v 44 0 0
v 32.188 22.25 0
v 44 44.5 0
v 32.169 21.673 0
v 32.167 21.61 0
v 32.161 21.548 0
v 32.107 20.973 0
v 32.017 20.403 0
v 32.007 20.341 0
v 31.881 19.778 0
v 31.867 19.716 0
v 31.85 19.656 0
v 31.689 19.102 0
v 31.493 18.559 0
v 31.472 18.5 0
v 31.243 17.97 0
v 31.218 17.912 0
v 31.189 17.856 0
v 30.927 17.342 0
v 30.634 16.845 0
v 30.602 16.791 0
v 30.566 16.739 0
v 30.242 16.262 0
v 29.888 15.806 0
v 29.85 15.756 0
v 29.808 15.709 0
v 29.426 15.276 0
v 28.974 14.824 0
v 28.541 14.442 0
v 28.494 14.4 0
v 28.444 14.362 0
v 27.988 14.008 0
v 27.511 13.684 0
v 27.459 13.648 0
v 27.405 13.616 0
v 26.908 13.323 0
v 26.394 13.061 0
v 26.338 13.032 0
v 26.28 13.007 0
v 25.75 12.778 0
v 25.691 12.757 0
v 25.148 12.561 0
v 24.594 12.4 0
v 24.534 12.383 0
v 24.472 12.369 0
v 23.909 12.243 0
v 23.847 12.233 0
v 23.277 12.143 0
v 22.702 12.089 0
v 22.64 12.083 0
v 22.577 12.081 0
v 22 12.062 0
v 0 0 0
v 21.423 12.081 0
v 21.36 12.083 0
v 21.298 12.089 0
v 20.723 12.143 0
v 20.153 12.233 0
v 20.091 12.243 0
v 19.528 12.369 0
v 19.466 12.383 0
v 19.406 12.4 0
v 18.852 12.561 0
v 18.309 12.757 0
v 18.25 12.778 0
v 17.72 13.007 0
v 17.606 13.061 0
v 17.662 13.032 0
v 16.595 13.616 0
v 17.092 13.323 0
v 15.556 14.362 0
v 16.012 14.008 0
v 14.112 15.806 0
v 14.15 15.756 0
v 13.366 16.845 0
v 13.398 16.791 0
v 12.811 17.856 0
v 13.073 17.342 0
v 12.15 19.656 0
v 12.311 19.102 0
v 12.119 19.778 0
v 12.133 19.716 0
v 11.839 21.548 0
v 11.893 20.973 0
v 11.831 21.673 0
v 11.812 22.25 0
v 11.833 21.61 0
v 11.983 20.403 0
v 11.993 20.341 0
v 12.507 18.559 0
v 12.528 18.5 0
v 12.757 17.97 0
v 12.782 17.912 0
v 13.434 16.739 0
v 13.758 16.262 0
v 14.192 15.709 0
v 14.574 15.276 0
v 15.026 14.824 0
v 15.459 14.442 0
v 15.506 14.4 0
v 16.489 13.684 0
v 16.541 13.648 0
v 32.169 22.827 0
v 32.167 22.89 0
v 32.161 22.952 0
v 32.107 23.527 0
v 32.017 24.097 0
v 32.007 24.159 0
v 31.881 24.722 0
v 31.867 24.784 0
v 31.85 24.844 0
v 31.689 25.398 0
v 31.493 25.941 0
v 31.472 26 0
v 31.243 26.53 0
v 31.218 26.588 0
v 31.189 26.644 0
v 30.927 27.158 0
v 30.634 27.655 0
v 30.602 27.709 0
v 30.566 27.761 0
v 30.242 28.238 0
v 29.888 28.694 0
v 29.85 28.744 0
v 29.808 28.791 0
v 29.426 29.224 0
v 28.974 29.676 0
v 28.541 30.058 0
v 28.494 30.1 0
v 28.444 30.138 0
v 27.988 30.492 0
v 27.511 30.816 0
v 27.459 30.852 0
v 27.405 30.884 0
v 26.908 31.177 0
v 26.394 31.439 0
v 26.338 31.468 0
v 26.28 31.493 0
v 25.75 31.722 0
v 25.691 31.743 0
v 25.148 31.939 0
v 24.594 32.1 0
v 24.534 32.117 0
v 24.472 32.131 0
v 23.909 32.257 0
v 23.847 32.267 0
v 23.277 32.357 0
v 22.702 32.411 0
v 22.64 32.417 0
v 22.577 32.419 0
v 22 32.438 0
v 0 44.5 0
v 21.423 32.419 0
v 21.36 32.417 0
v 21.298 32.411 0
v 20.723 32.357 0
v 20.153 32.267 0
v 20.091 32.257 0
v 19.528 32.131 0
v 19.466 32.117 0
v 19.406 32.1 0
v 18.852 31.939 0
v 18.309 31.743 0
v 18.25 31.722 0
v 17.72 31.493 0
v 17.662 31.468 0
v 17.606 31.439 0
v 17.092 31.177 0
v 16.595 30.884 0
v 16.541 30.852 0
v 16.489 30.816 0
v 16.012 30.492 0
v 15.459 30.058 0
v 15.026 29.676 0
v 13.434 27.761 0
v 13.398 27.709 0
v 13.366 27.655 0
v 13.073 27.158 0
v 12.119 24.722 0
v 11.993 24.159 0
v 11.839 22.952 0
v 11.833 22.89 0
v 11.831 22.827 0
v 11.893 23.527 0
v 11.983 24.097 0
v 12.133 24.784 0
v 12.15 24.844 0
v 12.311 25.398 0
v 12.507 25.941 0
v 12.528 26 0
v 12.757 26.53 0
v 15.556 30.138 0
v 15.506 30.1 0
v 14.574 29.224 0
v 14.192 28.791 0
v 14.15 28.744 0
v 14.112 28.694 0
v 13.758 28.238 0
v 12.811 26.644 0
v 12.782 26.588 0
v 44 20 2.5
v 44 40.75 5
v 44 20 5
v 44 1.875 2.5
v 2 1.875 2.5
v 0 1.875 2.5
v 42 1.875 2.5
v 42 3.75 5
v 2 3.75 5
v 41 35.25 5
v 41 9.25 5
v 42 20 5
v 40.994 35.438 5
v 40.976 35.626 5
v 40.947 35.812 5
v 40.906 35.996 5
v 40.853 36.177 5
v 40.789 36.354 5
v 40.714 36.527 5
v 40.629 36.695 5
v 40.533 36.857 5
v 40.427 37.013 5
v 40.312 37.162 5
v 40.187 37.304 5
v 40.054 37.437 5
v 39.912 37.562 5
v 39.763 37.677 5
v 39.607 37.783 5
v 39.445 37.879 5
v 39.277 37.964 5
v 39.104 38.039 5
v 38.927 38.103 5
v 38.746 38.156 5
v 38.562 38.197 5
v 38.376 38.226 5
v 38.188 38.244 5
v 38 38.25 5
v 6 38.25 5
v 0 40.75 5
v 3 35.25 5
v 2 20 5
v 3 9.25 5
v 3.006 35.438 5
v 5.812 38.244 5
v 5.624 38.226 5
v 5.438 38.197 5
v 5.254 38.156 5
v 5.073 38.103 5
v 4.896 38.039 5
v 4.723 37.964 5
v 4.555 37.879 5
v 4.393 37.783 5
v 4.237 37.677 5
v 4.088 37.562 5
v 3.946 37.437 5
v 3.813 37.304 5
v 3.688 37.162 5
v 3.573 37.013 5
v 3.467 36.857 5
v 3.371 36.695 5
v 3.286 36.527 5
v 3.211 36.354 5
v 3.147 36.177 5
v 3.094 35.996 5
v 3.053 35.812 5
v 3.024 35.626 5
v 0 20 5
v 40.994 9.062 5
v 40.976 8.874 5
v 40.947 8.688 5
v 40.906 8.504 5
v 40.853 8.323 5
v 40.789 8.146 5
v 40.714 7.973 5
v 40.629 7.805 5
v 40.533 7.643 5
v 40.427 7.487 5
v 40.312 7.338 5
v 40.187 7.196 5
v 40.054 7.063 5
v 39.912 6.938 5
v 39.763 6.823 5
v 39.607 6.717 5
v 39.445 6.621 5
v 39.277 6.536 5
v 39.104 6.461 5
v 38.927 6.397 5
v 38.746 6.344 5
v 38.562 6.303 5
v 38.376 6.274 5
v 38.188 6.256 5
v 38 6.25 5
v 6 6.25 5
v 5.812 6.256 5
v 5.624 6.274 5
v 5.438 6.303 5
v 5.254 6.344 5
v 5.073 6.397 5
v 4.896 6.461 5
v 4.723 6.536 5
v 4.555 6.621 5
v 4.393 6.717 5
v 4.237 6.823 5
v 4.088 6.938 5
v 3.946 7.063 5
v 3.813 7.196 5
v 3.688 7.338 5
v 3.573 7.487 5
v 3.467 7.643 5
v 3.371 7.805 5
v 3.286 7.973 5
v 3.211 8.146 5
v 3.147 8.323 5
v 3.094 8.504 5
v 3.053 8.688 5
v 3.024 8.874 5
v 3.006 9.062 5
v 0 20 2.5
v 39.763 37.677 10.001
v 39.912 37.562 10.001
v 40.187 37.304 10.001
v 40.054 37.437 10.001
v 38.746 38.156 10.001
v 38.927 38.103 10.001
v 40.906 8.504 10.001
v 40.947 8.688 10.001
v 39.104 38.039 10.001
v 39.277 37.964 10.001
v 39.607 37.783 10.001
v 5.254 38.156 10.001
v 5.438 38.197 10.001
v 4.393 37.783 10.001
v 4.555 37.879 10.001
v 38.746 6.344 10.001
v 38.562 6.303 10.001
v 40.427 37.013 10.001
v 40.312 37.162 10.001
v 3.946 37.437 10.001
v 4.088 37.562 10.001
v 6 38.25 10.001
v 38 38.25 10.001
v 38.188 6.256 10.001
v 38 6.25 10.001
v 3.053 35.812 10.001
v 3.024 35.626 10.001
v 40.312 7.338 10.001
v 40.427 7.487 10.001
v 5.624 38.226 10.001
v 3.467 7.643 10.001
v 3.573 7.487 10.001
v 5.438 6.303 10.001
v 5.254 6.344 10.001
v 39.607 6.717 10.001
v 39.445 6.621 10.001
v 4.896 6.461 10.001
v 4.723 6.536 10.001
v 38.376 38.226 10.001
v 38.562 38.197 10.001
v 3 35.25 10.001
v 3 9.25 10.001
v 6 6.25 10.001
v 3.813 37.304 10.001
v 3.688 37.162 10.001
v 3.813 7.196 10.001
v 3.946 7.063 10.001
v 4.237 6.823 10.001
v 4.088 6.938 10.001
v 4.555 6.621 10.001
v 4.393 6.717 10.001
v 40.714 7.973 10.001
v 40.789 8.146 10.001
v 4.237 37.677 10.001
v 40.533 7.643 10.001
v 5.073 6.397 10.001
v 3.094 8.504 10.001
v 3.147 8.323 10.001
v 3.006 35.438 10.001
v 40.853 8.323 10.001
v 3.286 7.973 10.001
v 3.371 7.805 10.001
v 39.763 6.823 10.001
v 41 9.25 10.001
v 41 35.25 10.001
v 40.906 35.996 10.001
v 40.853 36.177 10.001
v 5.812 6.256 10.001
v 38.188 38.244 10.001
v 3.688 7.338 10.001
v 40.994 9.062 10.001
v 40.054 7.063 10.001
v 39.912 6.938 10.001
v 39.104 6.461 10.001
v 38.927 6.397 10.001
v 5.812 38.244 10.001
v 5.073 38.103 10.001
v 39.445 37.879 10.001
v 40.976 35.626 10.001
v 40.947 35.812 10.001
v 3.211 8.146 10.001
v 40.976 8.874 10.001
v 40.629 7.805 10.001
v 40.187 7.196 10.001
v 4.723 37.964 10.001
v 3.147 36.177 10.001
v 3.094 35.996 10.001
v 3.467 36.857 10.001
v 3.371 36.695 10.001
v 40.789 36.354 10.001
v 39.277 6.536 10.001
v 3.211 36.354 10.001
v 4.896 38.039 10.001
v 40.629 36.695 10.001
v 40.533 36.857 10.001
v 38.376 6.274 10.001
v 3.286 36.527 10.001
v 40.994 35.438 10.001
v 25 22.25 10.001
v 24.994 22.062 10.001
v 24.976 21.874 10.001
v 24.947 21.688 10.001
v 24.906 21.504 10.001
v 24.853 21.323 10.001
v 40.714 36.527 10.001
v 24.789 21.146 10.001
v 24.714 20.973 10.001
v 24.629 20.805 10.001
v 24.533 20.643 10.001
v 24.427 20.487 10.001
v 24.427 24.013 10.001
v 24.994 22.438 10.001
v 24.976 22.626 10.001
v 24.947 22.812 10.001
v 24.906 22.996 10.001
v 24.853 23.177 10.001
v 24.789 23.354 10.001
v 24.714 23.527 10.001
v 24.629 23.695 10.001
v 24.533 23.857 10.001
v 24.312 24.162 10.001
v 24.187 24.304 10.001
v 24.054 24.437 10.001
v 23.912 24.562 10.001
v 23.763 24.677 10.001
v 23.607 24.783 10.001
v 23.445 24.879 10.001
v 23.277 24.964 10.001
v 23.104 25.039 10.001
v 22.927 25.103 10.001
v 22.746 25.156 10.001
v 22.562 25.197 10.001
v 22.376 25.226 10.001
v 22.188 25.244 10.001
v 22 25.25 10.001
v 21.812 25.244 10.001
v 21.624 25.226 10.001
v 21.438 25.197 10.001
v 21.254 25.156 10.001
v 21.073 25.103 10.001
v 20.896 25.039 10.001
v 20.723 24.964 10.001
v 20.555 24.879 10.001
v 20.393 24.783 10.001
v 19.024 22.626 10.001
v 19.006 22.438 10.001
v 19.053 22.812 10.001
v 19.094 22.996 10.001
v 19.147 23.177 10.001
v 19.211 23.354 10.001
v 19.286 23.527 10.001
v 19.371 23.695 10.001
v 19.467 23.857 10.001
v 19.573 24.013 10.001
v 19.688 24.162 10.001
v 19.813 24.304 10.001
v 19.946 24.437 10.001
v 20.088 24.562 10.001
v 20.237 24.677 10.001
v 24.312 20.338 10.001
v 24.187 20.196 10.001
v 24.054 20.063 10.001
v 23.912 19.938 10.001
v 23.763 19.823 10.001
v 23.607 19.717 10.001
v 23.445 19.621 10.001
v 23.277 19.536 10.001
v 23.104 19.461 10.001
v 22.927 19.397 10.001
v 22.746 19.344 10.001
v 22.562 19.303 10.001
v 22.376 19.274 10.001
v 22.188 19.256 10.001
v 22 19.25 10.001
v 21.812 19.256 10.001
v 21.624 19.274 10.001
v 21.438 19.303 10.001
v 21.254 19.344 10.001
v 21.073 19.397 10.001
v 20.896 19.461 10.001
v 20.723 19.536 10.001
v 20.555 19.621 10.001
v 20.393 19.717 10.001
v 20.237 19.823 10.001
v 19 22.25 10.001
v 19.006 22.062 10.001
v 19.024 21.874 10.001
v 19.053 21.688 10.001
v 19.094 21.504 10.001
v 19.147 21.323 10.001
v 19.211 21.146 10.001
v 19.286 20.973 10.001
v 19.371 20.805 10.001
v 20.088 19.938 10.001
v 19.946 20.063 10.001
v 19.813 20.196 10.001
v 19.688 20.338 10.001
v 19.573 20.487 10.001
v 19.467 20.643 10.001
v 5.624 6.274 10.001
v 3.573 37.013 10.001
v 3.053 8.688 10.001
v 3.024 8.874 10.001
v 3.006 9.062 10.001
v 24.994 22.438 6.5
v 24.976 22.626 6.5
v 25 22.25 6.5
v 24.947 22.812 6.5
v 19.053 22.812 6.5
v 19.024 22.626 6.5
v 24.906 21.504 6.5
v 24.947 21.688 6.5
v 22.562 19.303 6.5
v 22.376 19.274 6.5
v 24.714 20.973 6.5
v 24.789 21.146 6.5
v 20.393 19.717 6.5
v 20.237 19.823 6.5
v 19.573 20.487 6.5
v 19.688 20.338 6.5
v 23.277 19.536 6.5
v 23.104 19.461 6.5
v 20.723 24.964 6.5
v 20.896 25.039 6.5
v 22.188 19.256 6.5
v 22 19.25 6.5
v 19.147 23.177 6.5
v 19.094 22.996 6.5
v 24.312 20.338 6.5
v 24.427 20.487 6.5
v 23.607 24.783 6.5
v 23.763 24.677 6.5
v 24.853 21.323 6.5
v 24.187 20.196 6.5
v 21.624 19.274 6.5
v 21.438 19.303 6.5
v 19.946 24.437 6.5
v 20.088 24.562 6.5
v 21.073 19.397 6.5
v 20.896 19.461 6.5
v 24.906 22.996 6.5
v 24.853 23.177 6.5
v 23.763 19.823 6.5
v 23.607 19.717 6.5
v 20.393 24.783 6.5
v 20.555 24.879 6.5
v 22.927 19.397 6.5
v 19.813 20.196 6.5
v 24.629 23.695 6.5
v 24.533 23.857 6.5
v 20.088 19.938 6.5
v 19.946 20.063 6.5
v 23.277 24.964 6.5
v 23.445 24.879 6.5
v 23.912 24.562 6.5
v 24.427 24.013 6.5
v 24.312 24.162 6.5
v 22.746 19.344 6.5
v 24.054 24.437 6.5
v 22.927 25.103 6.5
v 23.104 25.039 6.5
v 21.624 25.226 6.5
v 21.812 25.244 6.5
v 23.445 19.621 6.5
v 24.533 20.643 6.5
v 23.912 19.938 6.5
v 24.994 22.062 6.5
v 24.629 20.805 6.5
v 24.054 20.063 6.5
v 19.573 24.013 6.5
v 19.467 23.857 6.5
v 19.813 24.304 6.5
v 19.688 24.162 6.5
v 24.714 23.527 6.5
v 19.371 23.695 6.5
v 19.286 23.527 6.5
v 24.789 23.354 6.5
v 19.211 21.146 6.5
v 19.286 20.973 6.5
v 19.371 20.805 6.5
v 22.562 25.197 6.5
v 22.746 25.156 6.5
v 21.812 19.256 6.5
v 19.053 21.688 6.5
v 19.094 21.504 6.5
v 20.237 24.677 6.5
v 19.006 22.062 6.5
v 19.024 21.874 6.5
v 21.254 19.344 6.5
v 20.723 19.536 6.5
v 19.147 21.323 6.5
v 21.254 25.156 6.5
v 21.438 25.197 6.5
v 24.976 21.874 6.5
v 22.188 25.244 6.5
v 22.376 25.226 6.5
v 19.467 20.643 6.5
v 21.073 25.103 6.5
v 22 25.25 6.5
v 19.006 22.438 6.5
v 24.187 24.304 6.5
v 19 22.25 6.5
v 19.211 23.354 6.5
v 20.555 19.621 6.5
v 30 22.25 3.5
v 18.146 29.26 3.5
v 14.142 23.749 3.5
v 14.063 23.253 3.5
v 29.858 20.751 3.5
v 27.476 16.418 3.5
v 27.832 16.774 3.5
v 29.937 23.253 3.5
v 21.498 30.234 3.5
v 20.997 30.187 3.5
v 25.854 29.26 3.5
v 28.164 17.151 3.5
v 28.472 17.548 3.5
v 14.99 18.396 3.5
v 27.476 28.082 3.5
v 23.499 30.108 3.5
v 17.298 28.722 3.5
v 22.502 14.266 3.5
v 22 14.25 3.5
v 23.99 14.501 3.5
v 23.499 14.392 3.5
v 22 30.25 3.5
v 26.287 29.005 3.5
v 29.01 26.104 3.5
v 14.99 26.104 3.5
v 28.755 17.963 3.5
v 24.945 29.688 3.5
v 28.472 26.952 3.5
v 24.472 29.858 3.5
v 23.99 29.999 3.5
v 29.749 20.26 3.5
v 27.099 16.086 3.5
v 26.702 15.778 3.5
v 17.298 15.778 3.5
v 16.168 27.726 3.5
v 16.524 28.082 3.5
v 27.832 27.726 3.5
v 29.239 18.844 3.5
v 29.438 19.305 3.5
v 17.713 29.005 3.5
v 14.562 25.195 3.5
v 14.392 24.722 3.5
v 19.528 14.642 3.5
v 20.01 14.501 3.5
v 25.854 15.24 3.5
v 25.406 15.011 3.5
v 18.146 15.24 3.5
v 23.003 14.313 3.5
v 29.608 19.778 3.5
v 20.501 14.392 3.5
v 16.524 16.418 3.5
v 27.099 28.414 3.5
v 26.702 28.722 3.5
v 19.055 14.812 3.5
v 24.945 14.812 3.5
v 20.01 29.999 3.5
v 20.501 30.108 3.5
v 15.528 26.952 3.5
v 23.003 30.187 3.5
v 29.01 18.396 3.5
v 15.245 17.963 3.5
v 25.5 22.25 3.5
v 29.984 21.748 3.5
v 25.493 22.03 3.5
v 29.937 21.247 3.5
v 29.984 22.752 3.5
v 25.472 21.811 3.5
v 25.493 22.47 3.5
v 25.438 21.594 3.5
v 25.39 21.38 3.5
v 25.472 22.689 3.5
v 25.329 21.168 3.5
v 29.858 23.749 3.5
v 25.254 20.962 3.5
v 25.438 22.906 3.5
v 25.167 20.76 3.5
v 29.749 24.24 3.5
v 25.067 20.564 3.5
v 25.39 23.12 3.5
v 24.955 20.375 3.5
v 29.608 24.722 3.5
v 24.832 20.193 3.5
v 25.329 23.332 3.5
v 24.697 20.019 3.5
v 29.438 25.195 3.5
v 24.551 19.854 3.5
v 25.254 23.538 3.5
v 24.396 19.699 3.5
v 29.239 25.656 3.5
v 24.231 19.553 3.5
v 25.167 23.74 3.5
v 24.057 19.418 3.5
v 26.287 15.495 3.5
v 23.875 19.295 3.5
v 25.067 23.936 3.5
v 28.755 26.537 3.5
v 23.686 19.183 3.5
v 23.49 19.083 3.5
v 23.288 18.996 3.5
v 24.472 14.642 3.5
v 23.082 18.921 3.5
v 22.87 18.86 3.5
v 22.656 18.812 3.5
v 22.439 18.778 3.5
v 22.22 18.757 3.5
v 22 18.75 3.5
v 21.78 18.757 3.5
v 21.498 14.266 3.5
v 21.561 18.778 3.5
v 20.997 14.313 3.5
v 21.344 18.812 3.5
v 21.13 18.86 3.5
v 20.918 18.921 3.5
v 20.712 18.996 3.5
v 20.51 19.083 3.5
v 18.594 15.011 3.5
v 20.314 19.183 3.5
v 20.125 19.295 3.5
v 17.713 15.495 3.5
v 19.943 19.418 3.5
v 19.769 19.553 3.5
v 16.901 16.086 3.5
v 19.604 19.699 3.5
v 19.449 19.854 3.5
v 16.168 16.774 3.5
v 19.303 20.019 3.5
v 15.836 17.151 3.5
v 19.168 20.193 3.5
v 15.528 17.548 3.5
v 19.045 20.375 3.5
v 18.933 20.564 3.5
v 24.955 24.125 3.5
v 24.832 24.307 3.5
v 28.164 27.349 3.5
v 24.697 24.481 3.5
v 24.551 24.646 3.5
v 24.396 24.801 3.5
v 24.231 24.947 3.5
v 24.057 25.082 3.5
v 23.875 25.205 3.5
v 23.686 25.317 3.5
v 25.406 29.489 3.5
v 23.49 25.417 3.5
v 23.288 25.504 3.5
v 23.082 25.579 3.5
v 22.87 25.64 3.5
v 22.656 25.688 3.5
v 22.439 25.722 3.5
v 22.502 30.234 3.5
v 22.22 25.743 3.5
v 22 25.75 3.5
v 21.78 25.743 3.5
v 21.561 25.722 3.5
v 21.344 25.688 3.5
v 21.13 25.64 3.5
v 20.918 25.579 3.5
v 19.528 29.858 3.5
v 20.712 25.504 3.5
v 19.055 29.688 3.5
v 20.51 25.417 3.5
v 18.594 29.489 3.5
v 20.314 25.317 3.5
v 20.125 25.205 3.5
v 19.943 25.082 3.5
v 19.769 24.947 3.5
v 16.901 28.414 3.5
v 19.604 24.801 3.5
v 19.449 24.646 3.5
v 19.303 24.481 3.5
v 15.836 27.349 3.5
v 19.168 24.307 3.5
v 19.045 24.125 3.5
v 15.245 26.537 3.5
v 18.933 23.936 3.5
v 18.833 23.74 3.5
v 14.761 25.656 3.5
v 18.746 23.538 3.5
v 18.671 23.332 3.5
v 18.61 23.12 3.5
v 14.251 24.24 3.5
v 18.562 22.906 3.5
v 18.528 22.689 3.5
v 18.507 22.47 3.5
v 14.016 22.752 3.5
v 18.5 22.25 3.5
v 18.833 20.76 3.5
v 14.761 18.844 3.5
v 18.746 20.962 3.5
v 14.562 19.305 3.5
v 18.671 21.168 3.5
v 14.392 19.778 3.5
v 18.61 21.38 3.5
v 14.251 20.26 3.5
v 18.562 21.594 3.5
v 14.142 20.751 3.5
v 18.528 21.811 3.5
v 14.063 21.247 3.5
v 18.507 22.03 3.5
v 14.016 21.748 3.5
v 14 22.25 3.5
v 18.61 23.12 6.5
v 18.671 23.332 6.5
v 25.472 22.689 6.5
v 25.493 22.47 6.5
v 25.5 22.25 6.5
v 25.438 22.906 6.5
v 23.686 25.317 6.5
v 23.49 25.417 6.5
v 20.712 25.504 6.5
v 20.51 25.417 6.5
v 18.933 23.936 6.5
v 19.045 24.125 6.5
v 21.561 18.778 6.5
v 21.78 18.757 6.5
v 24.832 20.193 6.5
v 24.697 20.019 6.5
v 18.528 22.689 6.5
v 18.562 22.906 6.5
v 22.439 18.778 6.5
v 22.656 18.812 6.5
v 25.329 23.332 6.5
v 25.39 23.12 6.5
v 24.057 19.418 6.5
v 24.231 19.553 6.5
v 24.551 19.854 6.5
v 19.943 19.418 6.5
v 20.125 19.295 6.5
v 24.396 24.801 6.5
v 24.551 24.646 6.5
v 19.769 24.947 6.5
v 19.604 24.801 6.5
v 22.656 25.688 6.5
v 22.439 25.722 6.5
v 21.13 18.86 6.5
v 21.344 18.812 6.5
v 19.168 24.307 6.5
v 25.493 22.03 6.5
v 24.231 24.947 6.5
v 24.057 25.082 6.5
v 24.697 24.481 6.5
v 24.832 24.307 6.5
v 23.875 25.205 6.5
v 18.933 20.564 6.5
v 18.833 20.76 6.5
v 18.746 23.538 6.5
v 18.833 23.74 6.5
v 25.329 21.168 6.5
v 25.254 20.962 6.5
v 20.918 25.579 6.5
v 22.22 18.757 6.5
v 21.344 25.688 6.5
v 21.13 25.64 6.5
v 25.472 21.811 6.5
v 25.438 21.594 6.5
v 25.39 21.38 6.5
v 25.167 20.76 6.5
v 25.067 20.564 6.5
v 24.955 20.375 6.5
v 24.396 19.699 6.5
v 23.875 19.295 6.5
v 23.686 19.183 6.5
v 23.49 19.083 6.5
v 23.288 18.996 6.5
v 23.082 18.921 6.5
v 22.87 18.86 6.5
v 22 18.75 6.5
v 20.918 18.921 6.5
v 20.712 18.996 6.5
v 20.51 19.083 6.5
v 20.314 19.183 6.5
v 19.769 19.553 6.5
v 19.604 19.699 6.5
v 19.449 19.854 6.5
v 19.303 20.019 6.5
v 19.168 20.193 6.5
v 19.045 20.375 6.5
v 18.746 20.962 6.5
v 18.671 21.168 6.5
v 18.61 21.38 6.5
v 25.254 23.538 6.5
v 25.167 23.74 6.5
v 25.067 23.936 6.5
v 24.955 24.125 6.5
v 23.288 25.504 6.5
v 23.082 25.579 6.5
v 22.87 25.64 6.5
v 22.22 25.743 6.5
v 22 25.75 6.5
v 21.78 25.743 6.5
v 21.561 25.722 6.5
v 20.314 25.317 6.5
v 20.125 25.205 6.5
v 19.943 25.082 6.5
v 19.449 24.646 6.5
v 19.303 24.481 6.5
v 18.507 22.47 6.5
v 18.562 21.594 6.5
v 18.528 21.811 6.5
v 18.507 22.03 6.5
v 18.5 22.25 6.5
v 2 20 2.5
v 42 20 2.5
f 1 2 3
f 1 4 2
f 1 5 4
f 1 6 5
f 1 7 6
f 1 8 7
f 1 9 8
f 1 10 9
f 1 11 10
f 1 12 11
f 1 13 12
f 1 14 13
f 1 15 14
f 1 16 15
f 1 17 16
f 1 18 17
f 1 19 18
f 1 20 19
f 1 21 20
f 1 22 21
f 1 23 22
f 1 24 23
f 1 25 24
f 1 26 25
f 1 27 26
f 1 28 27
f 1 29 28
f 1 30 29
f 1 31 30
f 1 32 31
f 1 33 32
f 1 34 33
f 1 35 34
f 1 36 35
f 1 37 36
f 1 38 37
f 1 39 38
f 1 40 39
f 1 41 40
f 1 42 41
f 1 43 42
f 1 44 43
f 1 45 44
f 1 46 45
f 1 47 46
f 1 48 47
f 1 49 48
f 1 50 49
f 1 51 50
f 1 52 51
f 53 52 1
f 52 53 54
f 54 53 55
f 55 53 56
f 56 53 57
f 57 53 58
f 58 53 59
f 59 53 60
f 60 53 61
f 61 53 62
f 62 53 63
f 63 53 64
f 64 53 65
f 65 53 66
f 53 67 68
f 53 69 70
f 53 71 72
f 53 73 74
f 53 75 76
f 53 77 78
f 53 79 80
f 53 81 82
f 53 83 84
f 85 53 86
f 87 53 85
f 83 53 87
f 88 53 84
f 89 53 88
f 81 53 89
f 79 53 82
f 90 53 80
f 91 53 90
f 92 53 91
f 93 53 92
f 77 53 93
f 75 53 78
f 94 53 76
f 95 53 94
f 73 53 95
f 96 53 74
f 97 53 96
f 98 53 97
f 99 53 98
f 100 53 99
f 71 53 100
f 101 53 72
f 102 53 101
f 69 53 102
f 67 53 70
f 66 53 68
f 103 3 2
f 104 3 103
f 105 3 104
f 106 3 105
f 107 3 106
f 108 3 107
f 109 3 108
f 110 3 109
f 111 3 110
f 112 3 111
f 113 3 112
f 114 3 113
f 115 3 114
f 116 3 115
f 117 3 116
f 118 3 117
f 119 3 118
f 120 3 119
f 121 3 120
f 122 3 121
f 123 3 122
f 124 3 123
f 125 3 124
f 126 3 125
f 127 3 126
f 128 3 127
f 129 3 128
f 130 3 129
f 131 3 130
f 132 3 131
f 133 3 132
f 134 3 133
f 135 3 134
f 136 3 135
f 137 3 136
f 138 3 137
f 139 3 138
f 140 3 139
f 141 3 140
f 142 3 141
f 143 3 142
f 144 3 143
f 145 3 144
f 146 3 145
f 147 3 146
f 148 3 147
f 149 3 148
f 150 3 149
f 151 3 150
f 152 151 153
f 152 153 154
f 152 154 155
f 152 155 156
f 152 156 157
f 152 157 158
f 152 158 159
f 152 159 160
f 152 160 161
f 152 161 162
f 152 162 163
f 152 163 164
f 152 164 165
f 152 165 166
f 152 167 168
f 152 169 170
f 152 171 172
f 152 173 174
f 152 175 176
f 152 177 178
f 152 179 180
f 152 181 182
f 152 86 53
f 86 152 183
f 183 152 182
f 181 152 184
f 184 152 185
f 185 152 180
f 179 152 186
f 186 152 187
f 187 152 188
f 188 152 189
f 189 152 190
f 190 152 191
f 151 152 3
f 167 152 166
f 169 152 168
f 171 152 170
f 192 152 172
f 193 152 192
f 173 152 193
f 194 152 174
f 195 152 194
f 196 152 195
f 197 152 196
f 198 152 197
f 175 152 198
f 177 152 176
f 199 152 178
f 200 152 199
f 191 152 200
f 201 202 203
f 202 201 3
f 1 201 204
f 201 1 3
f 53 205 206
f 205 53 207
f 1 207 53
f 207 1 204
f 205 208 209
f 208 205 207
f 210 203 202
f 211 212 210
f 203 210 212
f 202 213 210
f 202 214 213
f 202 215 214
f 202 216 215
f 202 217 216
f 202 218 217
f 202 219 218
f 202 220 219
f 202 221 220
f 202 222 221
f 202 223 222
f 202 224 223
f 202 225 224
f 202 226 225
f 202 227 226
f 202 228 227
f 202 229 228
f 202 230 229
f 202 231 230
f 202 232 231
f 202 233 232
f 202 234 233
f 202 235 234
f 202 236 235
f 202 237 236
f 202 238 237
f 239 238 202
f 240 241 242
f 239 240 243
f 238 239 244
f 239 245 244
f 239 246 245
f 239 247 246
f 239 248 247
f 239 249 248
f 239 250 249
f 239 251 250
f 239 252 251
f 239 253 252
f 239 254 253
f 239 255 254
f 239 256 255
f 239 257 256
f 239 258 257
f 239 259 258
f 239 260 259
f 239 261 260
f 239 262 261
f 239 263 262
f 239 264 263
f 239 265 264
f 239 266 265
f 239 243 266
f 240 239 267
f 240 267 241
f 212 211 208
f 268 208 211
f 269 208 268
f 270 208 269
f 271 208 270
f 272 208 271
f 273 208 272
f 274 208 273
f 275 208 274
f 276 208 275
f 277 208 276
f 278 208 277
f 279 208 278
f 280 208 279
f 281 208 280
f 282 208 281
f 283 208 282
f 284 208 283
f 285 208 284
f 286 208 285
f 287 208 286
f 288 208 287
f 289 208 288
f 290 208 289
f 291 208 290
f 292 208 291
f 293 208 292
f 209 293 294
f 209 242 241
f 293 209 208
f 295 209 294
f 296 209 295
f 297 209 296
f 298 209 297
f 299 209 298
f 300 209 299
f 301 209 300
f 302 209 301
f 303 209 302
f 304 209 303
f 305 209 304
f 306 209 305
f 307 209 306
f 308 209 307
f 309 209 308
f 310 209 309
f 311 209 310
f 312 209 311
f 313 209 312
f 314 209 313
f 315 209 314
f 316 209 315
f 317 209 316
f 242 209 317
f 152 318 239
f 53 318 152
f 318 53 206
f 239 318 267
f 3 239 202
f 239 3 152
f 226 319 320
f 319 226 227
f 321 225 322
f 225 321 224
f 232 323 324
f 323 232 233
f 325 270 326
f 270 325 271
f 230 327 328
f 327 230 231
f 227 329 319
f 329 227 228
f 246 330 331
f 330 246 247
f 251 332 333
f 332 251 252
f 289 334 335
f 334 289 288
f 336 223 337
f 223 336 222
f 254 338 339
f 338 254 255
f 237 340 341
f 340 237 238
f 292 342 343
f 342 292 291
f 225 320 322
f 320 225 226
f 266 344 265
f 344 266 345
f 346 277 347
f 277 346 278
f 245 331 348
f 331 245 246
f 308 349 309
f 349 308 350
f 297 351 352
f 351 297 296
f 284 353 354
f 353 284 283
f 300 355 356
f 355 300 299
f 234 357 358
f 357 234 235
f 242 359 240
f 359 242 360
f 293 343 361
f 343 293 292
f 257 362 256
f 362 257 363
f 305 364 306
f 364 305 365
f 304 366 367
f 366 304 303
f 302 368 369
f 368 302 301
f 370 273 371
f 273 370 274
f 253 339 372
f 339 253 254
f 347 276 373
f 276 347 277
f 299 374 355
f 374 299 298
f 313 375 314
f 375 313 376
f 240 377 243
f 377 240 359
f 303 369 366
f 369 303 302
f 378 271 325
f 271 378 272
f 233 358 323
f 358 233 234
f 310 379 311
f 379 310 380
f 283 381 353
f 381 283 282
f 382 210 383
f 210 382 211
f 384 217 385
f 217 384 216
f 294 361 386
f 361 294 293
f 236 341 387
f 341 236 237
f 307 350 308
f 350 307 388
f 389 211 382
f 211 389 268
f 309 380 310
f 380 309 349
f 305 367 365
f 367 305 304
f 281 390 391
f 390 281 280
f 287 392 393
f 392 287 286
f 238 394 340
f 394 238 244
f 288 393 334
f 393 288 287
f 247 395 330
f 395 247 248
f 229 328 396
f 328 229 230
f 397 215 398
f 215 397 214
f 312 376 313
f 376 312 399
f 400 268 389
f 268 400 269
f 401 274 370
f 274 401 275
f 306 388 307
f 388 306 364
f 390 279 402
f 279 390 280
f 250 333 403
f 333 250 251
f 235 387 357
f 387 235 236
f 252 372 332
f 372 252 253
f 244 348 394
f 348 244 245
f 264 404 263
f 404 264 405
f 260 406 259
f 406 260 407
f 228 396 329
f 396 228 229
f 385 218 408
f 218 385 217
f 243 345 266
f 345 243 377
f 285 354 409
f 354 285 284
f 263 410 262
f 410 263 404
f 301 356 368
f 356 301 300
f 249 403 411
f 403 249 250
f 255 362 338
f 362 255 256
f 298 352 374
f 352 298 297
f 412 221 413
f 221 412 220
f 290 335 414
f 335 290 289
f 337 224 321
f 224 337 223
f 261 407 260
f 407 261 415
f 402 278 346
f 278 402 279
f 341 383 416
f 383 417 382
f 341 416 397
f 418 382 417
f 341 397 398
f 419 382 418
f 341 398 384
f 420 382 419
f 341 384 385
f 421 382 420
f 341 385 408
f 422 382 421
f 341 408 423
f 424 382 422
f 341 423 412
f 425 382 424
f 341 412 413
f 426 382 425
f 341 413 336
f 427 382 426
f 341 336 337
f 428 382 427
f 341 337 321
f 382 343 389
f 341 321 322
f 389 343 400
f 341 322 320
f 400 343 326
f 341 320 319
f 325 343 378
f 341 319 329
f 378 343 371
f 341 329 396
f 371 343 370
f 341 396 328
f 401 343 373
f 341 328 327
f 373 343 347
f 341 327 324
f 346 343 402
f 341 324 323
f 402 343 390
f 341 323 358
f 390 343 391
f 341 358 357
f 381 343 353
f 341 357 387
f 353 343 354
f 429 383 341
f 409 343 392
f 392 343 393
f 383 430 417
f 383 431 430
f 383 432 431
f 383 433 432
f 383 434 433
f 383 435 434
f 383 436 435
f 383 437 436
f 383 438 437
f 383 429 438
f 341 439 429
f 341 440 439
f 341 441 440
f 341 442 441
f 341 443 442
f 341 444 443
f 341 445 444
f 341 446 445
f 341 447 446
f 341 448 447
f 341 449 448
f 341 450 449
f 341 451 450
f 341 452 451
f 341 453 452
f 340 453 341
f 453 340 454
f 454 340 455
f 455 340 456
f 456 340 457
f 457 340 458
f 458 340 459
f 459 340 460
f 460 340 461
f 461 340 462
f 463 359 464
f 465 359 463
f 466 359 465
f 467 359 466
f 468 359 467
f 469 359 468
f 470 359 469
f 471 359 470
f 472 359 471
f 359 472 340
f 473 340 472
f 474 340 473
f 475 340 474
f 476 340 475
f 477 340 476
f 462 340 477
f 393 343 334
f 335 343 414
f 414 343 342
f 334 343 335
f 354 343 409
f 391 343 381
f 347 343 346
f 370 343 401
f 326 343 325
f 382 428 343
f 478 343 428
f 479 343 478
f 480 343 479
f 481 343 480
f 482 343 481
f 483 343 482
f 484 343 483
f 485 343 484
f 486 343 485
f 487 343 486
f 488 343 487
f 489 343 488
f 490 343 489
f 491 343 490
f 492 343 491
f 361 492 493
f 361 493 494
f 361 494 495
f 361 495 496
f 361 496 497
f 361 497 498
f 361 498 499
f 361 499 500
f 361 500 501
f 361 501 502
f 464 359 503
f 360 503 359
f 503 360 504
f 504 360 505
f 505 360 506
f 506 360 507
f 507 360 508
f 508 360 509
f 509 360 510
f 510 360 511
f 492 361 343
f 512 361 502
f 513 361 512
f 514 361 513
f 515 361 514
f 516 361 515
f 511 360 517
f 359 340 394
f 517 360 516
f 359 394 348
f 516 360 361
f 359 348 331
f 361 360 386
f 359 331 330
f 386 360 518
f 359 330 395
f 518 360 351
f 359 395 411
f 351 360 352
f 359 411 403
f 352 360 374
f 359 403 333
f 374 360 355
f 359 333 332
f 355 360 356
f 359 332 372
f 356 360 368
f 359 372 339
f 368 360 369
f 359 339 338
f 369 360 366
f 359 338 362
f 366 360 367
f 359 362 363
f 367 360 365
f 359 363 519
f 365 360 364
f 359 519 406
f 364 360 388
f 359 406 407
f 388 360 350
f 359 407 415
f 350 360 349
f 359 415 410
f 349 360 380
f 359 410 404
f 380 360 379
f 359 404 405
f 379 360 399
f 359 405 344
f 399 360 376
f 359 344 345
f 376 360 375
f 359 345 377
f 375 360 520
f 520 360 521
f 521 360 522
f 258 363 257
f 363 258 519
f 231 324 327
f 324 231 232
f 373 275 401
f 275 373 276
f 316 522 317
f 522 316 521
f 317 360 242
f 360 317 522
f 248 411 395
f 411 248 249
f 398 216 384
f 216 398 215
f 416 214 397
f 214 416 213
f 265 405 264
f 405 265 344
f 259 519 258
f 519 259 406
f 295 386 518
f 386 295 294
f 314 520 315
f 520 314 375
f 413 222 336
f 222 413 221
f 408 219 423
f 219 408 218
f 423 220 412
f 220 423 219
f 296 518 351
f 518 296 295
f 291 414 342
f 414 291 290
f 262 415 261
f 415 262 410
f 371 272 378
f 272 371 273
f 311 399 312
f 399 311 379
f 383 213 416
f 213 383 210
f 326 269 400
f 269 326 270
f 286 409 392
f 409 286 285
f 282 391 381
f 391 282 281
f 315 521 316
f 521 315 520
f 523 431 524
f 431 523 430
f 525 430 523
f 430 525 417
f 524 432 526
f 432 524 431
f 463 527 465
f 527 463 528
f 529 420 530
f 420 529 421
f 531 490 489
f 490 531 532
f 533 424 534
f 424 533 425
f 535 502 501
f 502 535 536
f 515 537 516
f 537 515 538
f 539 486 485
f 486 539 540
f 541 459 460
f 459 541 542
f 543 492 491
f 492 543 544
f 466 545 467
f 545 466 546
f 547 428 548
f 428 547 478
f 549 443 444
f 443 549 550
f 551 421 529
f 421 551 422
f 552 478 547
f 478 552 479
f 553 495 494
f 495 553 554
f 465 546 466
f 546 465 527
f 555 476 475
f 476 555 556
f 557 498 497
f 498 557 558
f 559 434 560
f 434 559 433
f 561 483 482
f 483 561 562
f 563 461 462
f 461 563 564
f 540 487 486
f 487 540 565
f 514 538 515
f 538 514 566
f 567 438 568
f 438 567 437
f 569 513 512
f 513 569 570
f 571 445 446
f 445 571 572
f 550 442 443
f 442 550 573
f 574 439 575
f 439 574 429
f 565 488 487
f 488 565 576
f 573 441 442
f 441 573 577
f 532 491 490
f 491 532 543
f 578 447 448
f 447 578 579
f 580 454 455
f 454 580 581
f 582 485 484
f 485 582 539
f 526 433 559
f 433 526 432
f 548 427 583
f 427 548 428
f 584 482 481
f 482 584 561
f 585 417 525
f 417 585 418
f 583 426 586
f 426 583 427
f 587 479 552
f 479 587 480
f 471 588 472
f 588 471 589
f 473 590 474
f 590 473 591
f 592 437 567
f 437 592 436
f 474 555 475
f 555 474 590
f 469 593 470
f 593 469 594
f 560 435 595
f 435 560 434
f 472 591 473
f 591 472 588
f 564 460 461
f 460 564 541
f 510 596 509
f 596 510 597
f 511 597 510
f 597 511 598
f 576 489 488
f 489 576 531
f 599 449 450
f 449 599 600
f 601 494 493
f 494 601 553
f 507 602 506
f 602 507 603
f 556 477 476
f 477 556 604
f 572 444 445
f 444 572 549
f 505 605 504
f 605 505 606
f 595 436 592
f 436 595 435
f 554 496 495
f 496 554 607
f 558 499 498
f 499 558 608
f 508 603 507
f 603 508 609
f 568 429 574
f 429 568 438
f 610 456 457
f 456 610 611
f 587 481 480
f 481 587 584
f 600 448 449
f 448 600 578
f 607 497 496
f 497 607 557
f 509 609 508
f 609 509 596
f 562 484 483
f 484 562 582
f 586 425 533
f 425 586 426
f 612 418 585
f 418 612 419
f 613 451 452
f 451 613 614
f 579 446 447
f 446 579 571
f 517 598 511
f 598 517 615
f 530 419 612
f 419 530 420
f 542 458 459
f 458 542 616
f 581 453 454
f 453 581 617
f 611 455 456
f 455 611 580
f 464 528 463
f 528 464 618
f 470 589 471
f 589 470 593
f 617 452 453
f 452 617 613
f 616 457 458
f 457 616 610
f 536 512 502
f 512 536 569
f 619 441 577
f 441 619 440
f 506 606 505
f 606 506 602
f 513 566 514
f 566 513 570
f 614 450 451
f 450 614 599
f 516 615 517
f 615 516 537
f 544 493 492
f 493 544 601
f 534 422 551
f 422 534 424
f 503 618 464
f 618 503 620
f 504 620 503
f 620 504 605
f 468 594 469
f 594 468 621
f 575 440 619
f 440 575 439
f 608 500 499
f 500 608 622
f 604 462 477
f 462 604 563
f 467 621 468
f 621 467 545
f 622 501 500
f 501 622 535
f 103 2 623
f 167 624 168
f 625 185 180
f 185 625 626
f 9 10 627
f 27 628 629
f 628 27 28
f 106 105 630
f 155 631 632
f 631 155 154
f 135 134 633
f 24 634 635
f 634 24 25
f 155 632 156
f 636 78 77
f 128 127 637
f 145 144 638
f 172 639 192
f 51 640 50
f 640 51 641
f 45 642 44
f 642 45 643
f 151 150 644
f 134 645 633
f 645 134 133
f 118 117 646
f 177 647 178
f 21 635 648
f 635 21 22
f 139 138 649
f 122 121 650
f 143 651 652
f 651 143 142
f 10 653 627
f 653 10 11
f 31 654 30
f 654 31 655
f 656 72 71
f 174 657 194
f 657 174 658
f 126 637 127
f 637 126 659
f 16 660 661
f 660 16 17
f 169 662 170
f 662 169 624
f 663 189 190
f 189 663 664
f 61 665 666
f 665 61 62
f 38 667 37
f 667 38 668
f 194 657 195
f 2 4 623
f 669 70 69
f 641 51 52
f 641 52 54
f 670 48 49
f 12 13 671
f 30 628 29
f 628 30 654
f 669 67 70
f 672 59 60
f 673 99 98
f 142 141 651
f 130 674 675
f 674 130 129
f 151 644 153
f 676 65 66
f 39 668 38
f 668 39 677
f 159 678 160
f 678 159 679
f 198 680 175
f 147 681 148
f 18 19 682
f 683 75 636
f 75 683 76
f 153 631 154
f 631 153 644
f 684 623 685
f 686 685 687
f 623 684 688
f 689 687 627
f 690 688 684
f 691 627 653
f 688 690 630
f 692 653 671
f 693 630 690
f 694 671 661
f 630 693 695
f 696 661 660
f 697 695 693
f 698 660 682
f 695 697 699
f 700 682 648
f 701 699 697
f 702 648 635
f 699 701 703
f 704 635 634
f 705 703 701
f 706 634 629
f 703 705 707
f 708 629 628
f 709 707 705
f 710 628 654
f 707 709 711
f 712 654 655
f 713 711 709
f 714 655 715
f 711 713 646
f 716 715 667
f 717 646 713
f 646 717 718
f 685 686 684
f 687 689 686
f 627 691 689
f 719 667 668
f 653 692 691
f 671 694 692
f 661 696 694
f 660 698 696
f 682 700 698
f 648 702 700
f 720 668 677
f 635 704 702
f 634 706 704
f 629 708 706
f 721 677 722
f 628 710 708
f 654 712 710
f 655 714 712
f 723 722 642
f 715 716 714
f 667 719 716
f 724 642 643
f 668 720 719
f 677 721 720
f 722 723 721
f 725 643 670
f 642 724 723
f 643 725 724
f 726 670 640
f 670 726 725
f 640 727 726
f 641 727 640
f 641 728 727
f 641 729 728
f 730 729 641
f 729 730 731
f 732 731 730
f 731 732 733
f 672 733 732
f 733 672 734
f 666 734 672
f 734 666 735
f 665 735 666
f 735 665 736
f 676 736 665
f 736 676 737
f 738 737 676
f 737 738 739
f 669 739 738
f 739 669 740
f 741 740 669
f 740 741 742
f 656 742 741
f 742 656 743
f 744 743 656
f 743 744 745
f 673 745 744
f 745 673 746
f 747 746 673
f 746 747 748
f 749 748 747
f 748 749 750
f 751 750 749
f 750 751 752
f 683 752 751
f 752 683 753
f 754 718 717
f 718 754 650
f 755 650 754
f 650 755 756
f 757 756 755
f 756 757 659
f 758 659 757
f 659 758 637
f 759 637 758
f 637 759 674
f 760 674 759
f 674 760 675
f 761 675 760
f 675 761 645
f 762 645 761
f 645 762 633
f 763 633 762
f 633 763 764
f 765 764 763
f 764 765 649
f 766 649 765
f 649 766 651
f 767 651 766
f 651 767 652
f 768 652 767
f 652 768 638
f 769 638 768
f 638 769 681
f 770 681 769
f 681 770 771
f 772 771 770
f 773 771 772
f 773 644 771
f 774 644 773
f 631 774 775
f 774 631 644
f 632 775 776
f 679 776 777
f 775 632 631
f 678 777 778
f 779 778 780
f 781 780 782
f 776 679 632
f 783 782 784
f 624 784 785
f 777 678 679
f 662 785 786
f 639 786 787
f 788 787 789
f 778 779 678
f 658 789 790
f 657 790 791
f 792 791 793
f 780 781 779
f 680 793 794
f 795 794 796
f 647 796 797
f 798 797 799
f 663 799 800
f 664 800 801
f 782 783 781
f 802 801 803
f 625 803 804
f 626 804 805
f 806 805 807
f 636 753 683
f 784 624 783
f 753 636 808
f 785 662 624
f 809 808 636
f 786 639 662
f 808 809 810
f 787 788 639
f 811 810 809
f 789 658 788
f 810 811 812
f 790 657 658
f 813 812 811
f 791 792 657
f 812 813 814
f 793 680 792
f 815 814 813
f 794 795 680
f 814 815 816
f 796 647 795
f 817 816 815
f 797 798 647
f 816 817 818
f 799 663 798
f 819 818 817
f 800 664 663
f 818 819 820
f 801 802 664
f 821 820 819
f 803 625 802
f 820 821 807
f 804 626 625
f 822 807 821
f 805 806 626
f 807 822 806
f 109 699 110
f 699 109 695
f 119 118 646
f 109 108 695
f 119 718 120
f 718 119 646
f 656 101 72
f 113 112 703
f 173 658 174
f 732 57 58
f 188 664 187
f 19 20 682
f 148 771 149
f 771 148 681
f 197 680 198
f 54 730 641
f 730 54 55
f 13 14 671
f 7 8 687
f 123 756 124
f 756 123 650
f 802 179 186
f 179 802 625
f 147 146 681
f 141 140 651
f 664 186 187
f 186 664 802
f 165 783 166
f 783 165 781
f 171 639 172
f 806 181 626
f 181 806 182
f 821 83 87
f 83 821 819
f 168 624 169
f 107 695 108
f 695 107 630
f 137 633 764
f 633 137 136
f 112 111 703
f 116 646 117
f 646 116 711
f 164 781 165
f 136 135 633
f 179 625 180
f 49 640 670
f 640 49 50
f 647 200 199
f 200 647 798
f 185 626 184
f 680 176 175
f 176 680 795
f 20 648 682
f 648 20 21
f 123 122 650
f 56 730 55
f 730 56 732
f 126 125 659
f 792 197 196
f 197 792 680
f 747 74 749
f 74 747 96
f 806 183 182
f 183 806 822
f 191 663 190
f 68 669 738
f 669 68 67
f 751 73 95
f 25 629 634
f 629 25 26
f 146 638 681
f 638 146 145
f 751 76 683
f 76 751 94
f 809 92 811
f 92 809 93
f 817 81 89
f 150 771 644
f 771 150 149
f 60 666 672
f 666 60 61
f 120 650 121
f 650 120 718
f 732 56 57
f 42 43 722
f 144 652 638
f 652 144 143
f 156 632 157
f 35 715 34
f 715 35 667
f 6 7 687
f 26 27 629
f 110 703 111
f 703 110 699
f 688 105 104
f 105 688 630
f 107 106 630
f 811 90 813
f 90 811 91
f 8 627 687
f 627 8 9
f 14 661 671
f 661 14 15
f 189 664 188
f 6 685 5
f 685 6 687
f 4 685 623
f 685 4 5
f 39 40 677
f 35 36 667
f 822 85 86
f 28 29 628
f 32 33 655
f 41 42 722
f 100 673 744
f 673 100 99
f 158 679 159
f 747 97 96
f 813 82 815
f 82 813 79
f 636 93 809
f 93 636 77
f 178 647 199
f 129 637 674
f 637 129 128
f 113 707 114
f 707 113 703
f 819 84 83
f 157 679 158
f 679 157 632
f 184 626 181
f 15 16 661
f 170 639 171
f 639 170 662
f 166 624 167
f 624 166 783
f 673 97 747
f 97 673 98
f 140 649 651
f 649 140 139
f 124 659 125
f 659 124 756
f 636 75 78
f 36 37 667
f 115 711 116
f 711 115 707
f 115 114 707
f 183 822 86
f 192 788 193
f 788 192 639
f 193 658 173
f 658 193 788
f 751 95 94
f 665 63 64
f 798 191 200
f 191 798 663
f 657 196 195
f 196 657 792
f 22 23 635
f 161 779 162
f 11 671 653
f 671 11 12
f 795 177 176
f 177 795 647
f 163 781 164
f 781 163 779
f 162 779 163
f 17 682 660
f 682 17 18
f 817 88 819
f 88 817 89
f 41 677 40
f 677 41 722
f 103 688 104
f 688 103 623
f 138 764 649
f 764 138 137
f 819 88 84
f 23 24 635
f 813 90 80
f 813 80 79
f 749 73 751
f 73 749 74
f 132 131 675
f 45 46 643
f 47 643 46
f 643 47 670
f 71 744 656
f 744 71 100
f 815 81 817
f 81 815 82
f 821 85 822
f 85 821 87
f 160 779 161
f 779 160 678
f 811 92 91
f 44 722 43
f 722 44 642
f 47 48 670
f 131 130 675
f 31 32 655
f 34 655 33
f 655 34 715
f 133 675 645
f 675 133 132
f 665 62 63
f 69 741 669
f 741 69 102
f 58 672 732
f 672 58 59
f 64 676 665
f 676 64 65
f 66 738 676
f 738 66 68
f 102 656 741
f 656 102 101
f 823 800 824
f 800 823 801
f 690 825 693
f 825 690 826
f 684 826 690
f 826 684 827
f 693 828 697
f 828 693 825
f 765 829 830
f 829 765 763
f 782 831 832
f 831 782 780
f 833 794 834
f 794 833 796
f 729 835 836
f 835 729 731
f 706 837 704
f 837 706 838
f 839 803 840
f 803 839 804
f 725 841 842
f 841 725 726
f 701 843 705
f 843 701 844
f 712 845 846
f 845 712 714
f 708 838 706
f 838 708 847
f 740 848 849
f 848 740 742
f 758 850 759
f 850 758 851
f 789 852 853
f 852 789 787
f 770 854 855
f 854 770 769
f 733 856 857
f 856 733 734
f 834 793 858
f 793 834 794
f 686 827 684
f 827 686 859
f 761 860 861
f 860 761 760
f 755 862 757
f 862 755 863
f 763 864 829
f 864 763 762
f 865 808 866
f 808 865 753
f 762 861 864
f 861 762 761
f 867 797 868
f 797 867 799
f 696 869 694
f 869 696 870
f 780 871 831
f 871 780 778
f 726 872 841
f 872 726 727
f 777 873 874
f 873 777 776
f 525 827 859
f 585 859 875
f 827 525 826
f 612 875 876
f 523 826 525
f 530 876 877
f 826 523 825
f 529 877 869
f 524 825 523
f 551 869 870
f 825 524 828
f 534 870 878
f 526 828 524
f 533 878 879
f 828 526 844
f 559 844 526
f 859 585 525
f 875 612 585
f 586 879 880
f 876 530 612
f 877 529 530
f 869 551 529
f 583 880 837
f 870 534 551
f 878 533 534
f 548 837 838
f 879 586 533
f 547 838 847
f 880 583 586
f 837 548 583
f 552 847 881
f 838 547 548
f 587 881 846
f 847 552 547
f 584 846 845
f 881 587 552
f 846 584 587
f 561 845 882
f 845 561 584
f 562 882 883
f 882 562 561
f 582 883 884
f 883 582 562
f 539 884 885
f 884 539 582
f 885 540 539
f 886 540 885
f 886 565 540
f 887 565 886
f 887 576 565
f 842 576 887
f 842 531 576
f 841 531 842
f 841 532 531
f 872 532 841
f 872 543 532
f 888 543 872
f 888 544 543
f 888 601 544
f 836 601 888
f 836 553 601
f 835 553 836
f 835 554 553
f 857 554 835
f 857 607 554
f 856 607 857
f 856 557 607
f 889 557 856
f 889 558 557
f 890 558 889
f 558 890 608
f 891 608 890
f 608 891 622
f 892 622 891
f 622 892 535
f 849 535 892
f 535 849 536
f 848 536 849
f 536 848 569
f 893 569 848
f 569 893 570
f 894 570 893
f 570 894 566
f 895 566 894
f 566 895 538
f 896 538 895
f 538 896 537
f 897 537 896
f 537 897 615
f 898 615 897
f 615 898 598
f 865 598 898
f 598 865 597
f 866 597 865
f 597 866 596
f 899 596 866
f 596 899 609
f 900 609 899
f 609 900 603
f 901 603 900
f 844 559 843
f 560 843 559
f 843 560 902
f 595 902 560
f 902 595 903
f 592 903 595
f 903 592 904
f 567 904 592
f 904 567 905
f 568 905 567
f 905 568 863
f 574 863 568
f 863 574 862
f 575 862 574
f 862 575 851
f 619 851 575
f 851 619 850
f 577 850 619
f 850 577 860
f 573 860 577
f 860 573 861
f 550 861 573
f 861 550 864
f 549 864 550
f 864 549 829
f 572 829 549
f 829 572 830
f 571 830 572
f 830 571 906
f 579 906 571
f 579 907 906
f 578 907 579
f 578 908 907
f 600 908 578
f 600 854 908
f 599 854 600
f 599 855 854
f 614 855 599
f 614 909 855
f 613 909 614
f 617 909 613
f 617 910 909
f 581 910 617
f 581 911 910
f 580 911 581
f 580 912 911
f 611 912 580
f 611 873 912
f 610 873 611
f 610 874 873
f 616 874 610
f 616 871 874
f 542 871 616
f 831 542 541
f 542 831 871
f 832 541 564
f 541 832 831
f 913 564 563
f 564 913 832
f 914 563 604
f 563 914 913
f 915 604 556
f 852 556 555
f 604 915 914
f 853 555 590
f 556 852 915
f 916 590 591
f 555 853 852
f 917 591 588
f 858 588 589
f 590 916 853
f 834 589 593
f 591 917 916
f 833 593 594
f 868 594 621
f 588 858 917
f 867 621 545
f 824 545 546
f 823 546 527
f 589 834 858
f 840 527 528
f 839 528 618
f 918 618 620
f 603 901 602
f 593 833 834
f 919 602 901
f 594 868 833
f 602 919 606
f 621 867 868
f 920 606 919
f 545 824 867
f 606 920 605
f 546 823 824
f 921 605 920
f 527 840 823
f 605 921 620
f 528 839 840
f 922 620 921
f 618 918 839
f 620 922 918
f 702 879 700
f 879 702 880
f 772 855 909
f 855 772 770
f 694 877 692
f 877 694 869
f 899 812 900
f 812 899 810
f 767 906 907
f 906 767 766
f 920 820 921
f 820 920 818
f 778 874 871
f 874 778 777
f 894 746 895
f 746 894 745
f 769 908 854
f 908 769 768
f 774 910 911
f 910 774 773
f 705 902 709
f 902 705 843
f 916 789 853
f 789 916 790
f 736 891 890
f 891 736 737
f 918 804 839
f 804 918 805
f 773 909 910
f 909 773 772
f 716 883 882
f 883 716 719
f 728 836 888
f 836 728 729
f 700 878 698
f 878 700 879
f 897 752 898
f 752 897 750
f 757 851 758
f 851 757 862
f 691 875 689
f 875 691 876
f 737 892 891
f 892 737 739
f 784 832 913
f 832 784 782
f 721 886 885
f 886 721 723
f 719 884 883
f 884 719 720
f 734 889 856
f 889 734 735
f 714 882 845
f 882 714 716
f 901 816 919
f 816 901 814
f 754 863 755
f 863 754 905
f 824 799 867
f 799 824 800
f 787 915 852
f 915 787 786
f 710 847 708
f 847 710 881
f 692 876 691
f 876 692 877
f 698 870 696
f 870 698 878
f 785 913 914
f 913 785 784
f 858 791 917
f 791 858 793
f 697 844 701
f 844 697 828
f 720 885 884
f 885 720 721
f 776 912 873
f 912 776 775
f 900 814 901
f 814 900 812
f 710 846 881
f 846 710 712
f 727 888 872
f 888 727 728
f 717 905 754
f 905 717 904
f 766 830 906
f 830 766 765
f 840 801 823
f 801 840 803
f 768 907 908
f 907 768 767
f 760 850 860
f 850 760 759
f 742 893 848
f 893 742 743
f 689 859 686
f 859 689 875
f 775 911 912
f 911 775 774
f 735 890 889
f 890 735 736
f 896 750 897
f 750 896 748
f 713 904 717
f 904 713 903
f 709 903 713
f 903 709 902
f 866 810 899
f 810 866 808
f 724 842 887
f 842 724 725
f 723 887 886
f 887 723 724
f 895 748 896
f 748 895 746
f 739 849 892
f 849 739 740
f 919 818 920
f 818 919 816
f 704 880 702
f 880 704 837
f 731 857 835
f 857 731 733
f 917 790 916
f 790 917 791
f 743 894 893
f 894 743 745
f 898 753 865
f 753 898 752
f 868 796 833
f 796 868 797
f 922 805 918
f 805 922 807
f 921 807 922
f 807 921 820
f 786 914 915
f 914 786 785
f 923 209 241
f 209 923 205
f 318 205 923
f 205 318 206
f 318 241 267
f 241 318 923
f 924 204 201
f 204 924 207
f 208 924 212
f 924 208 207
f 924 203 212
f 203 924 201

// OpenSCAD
translate (0,0,0);
Laenge_Fuss_unten = 44.5;
Laenge_Fuss_oben = 37;
Versatz = (Laenge_Fuss_unten - Laenge_Fuss_oben)/2;
Gesamtdicke = 10;
Breite_Fuss = 44;
Dicke_Fuss = 5;
Breite_Oberteil = 38;
Laenge_Oberteil = 32;
Dicke_Oberteil = Gesamtdicke - Dicke_Fuss;
Rand_gerade = (Breite_Fuss - Breite_Oberteil)/2;
Rand_schraeg = (Laenge_Fuss_oben - Laenge_Oberteil)/2;
Kerbenbreite = 2;
Kerbenlaenge = 20;
Kerbentiefe = 2.5;
$fn=50 + 50;
module schuh (){
    CubePoints = [
  [  0,  0,  0 ],  //0
  [ Breite_Fuss,  0,  0 ],  //1
  [ Breite_Fuss,  Laenge_Fuss_unten,  0 ],  //2
  [  0,  Laenge_Fuss_unten,  0 ],  //3
  [  0,  Versatz,  Dicke_Fuss ],  //4
  [ Breite_Fuss,  Versatz, Dicke_Fuss ],  //5
  [ Breite_Fuss,  Versatz + Laenge_Fuss_oben , Dicke_Fuss],  //6
  [  0, Versatz + Laenge_Fuss_oben , Dicke_Fuss]]; //7
  
CubeFaces = [
  [0,1,2,3],  // bottom
  [4,5,1,0],  // front
  [7,6,5,4],  // top
  [5,6,2,1],  // right
  [6,7,3,2],  // back
  [7,4,0,3]]; // left
polyhedron( CubePoints, CubeFaces);
};

module platte() {
   minkowski () {
        cube([Breite_Oberteil-6 , Laenge_Oberteil-6, Dicke_Oberteil]);
        translate ([3,3,0])cylinder(r=3,0.001);
    }
}

module Adapter_voll() {schuh();
translate ([Rand_gerade, Rand_schraeg+Versatz, Dicke_Fuss])
platte();
}
difference()
{
Adapter_voll();
translate([Breite_Fuss/2, Laenge_Fuss_unten/2,-0.5]) cylinder(r=3,Gesamtdicke+1);
translate([Breite_Fuss/2, Laenge_Fuss_unten/2,-0.5]) cylinder(r1=10.5, r2=8,(Dicke_Fuss-1));
translate([Breite_Fuss/2, Laenge_Fuss_unten/2,-0.5]) cylinder(r=3.5,Dicke_Fuss+2);    
  
translate([0,0,Dicke_Fuss-Kerbentiefe]) cube([Kerbenbreite,Kerbenlaenge,Kerbentiefe]);
translate([Breite_Fuss-Kerbenbreite,0,Dicke_Fuss-Kerbentiefe]) cube([Kerbenbreite,Kerbenlaenge,Kerbentiefe]);    
}
